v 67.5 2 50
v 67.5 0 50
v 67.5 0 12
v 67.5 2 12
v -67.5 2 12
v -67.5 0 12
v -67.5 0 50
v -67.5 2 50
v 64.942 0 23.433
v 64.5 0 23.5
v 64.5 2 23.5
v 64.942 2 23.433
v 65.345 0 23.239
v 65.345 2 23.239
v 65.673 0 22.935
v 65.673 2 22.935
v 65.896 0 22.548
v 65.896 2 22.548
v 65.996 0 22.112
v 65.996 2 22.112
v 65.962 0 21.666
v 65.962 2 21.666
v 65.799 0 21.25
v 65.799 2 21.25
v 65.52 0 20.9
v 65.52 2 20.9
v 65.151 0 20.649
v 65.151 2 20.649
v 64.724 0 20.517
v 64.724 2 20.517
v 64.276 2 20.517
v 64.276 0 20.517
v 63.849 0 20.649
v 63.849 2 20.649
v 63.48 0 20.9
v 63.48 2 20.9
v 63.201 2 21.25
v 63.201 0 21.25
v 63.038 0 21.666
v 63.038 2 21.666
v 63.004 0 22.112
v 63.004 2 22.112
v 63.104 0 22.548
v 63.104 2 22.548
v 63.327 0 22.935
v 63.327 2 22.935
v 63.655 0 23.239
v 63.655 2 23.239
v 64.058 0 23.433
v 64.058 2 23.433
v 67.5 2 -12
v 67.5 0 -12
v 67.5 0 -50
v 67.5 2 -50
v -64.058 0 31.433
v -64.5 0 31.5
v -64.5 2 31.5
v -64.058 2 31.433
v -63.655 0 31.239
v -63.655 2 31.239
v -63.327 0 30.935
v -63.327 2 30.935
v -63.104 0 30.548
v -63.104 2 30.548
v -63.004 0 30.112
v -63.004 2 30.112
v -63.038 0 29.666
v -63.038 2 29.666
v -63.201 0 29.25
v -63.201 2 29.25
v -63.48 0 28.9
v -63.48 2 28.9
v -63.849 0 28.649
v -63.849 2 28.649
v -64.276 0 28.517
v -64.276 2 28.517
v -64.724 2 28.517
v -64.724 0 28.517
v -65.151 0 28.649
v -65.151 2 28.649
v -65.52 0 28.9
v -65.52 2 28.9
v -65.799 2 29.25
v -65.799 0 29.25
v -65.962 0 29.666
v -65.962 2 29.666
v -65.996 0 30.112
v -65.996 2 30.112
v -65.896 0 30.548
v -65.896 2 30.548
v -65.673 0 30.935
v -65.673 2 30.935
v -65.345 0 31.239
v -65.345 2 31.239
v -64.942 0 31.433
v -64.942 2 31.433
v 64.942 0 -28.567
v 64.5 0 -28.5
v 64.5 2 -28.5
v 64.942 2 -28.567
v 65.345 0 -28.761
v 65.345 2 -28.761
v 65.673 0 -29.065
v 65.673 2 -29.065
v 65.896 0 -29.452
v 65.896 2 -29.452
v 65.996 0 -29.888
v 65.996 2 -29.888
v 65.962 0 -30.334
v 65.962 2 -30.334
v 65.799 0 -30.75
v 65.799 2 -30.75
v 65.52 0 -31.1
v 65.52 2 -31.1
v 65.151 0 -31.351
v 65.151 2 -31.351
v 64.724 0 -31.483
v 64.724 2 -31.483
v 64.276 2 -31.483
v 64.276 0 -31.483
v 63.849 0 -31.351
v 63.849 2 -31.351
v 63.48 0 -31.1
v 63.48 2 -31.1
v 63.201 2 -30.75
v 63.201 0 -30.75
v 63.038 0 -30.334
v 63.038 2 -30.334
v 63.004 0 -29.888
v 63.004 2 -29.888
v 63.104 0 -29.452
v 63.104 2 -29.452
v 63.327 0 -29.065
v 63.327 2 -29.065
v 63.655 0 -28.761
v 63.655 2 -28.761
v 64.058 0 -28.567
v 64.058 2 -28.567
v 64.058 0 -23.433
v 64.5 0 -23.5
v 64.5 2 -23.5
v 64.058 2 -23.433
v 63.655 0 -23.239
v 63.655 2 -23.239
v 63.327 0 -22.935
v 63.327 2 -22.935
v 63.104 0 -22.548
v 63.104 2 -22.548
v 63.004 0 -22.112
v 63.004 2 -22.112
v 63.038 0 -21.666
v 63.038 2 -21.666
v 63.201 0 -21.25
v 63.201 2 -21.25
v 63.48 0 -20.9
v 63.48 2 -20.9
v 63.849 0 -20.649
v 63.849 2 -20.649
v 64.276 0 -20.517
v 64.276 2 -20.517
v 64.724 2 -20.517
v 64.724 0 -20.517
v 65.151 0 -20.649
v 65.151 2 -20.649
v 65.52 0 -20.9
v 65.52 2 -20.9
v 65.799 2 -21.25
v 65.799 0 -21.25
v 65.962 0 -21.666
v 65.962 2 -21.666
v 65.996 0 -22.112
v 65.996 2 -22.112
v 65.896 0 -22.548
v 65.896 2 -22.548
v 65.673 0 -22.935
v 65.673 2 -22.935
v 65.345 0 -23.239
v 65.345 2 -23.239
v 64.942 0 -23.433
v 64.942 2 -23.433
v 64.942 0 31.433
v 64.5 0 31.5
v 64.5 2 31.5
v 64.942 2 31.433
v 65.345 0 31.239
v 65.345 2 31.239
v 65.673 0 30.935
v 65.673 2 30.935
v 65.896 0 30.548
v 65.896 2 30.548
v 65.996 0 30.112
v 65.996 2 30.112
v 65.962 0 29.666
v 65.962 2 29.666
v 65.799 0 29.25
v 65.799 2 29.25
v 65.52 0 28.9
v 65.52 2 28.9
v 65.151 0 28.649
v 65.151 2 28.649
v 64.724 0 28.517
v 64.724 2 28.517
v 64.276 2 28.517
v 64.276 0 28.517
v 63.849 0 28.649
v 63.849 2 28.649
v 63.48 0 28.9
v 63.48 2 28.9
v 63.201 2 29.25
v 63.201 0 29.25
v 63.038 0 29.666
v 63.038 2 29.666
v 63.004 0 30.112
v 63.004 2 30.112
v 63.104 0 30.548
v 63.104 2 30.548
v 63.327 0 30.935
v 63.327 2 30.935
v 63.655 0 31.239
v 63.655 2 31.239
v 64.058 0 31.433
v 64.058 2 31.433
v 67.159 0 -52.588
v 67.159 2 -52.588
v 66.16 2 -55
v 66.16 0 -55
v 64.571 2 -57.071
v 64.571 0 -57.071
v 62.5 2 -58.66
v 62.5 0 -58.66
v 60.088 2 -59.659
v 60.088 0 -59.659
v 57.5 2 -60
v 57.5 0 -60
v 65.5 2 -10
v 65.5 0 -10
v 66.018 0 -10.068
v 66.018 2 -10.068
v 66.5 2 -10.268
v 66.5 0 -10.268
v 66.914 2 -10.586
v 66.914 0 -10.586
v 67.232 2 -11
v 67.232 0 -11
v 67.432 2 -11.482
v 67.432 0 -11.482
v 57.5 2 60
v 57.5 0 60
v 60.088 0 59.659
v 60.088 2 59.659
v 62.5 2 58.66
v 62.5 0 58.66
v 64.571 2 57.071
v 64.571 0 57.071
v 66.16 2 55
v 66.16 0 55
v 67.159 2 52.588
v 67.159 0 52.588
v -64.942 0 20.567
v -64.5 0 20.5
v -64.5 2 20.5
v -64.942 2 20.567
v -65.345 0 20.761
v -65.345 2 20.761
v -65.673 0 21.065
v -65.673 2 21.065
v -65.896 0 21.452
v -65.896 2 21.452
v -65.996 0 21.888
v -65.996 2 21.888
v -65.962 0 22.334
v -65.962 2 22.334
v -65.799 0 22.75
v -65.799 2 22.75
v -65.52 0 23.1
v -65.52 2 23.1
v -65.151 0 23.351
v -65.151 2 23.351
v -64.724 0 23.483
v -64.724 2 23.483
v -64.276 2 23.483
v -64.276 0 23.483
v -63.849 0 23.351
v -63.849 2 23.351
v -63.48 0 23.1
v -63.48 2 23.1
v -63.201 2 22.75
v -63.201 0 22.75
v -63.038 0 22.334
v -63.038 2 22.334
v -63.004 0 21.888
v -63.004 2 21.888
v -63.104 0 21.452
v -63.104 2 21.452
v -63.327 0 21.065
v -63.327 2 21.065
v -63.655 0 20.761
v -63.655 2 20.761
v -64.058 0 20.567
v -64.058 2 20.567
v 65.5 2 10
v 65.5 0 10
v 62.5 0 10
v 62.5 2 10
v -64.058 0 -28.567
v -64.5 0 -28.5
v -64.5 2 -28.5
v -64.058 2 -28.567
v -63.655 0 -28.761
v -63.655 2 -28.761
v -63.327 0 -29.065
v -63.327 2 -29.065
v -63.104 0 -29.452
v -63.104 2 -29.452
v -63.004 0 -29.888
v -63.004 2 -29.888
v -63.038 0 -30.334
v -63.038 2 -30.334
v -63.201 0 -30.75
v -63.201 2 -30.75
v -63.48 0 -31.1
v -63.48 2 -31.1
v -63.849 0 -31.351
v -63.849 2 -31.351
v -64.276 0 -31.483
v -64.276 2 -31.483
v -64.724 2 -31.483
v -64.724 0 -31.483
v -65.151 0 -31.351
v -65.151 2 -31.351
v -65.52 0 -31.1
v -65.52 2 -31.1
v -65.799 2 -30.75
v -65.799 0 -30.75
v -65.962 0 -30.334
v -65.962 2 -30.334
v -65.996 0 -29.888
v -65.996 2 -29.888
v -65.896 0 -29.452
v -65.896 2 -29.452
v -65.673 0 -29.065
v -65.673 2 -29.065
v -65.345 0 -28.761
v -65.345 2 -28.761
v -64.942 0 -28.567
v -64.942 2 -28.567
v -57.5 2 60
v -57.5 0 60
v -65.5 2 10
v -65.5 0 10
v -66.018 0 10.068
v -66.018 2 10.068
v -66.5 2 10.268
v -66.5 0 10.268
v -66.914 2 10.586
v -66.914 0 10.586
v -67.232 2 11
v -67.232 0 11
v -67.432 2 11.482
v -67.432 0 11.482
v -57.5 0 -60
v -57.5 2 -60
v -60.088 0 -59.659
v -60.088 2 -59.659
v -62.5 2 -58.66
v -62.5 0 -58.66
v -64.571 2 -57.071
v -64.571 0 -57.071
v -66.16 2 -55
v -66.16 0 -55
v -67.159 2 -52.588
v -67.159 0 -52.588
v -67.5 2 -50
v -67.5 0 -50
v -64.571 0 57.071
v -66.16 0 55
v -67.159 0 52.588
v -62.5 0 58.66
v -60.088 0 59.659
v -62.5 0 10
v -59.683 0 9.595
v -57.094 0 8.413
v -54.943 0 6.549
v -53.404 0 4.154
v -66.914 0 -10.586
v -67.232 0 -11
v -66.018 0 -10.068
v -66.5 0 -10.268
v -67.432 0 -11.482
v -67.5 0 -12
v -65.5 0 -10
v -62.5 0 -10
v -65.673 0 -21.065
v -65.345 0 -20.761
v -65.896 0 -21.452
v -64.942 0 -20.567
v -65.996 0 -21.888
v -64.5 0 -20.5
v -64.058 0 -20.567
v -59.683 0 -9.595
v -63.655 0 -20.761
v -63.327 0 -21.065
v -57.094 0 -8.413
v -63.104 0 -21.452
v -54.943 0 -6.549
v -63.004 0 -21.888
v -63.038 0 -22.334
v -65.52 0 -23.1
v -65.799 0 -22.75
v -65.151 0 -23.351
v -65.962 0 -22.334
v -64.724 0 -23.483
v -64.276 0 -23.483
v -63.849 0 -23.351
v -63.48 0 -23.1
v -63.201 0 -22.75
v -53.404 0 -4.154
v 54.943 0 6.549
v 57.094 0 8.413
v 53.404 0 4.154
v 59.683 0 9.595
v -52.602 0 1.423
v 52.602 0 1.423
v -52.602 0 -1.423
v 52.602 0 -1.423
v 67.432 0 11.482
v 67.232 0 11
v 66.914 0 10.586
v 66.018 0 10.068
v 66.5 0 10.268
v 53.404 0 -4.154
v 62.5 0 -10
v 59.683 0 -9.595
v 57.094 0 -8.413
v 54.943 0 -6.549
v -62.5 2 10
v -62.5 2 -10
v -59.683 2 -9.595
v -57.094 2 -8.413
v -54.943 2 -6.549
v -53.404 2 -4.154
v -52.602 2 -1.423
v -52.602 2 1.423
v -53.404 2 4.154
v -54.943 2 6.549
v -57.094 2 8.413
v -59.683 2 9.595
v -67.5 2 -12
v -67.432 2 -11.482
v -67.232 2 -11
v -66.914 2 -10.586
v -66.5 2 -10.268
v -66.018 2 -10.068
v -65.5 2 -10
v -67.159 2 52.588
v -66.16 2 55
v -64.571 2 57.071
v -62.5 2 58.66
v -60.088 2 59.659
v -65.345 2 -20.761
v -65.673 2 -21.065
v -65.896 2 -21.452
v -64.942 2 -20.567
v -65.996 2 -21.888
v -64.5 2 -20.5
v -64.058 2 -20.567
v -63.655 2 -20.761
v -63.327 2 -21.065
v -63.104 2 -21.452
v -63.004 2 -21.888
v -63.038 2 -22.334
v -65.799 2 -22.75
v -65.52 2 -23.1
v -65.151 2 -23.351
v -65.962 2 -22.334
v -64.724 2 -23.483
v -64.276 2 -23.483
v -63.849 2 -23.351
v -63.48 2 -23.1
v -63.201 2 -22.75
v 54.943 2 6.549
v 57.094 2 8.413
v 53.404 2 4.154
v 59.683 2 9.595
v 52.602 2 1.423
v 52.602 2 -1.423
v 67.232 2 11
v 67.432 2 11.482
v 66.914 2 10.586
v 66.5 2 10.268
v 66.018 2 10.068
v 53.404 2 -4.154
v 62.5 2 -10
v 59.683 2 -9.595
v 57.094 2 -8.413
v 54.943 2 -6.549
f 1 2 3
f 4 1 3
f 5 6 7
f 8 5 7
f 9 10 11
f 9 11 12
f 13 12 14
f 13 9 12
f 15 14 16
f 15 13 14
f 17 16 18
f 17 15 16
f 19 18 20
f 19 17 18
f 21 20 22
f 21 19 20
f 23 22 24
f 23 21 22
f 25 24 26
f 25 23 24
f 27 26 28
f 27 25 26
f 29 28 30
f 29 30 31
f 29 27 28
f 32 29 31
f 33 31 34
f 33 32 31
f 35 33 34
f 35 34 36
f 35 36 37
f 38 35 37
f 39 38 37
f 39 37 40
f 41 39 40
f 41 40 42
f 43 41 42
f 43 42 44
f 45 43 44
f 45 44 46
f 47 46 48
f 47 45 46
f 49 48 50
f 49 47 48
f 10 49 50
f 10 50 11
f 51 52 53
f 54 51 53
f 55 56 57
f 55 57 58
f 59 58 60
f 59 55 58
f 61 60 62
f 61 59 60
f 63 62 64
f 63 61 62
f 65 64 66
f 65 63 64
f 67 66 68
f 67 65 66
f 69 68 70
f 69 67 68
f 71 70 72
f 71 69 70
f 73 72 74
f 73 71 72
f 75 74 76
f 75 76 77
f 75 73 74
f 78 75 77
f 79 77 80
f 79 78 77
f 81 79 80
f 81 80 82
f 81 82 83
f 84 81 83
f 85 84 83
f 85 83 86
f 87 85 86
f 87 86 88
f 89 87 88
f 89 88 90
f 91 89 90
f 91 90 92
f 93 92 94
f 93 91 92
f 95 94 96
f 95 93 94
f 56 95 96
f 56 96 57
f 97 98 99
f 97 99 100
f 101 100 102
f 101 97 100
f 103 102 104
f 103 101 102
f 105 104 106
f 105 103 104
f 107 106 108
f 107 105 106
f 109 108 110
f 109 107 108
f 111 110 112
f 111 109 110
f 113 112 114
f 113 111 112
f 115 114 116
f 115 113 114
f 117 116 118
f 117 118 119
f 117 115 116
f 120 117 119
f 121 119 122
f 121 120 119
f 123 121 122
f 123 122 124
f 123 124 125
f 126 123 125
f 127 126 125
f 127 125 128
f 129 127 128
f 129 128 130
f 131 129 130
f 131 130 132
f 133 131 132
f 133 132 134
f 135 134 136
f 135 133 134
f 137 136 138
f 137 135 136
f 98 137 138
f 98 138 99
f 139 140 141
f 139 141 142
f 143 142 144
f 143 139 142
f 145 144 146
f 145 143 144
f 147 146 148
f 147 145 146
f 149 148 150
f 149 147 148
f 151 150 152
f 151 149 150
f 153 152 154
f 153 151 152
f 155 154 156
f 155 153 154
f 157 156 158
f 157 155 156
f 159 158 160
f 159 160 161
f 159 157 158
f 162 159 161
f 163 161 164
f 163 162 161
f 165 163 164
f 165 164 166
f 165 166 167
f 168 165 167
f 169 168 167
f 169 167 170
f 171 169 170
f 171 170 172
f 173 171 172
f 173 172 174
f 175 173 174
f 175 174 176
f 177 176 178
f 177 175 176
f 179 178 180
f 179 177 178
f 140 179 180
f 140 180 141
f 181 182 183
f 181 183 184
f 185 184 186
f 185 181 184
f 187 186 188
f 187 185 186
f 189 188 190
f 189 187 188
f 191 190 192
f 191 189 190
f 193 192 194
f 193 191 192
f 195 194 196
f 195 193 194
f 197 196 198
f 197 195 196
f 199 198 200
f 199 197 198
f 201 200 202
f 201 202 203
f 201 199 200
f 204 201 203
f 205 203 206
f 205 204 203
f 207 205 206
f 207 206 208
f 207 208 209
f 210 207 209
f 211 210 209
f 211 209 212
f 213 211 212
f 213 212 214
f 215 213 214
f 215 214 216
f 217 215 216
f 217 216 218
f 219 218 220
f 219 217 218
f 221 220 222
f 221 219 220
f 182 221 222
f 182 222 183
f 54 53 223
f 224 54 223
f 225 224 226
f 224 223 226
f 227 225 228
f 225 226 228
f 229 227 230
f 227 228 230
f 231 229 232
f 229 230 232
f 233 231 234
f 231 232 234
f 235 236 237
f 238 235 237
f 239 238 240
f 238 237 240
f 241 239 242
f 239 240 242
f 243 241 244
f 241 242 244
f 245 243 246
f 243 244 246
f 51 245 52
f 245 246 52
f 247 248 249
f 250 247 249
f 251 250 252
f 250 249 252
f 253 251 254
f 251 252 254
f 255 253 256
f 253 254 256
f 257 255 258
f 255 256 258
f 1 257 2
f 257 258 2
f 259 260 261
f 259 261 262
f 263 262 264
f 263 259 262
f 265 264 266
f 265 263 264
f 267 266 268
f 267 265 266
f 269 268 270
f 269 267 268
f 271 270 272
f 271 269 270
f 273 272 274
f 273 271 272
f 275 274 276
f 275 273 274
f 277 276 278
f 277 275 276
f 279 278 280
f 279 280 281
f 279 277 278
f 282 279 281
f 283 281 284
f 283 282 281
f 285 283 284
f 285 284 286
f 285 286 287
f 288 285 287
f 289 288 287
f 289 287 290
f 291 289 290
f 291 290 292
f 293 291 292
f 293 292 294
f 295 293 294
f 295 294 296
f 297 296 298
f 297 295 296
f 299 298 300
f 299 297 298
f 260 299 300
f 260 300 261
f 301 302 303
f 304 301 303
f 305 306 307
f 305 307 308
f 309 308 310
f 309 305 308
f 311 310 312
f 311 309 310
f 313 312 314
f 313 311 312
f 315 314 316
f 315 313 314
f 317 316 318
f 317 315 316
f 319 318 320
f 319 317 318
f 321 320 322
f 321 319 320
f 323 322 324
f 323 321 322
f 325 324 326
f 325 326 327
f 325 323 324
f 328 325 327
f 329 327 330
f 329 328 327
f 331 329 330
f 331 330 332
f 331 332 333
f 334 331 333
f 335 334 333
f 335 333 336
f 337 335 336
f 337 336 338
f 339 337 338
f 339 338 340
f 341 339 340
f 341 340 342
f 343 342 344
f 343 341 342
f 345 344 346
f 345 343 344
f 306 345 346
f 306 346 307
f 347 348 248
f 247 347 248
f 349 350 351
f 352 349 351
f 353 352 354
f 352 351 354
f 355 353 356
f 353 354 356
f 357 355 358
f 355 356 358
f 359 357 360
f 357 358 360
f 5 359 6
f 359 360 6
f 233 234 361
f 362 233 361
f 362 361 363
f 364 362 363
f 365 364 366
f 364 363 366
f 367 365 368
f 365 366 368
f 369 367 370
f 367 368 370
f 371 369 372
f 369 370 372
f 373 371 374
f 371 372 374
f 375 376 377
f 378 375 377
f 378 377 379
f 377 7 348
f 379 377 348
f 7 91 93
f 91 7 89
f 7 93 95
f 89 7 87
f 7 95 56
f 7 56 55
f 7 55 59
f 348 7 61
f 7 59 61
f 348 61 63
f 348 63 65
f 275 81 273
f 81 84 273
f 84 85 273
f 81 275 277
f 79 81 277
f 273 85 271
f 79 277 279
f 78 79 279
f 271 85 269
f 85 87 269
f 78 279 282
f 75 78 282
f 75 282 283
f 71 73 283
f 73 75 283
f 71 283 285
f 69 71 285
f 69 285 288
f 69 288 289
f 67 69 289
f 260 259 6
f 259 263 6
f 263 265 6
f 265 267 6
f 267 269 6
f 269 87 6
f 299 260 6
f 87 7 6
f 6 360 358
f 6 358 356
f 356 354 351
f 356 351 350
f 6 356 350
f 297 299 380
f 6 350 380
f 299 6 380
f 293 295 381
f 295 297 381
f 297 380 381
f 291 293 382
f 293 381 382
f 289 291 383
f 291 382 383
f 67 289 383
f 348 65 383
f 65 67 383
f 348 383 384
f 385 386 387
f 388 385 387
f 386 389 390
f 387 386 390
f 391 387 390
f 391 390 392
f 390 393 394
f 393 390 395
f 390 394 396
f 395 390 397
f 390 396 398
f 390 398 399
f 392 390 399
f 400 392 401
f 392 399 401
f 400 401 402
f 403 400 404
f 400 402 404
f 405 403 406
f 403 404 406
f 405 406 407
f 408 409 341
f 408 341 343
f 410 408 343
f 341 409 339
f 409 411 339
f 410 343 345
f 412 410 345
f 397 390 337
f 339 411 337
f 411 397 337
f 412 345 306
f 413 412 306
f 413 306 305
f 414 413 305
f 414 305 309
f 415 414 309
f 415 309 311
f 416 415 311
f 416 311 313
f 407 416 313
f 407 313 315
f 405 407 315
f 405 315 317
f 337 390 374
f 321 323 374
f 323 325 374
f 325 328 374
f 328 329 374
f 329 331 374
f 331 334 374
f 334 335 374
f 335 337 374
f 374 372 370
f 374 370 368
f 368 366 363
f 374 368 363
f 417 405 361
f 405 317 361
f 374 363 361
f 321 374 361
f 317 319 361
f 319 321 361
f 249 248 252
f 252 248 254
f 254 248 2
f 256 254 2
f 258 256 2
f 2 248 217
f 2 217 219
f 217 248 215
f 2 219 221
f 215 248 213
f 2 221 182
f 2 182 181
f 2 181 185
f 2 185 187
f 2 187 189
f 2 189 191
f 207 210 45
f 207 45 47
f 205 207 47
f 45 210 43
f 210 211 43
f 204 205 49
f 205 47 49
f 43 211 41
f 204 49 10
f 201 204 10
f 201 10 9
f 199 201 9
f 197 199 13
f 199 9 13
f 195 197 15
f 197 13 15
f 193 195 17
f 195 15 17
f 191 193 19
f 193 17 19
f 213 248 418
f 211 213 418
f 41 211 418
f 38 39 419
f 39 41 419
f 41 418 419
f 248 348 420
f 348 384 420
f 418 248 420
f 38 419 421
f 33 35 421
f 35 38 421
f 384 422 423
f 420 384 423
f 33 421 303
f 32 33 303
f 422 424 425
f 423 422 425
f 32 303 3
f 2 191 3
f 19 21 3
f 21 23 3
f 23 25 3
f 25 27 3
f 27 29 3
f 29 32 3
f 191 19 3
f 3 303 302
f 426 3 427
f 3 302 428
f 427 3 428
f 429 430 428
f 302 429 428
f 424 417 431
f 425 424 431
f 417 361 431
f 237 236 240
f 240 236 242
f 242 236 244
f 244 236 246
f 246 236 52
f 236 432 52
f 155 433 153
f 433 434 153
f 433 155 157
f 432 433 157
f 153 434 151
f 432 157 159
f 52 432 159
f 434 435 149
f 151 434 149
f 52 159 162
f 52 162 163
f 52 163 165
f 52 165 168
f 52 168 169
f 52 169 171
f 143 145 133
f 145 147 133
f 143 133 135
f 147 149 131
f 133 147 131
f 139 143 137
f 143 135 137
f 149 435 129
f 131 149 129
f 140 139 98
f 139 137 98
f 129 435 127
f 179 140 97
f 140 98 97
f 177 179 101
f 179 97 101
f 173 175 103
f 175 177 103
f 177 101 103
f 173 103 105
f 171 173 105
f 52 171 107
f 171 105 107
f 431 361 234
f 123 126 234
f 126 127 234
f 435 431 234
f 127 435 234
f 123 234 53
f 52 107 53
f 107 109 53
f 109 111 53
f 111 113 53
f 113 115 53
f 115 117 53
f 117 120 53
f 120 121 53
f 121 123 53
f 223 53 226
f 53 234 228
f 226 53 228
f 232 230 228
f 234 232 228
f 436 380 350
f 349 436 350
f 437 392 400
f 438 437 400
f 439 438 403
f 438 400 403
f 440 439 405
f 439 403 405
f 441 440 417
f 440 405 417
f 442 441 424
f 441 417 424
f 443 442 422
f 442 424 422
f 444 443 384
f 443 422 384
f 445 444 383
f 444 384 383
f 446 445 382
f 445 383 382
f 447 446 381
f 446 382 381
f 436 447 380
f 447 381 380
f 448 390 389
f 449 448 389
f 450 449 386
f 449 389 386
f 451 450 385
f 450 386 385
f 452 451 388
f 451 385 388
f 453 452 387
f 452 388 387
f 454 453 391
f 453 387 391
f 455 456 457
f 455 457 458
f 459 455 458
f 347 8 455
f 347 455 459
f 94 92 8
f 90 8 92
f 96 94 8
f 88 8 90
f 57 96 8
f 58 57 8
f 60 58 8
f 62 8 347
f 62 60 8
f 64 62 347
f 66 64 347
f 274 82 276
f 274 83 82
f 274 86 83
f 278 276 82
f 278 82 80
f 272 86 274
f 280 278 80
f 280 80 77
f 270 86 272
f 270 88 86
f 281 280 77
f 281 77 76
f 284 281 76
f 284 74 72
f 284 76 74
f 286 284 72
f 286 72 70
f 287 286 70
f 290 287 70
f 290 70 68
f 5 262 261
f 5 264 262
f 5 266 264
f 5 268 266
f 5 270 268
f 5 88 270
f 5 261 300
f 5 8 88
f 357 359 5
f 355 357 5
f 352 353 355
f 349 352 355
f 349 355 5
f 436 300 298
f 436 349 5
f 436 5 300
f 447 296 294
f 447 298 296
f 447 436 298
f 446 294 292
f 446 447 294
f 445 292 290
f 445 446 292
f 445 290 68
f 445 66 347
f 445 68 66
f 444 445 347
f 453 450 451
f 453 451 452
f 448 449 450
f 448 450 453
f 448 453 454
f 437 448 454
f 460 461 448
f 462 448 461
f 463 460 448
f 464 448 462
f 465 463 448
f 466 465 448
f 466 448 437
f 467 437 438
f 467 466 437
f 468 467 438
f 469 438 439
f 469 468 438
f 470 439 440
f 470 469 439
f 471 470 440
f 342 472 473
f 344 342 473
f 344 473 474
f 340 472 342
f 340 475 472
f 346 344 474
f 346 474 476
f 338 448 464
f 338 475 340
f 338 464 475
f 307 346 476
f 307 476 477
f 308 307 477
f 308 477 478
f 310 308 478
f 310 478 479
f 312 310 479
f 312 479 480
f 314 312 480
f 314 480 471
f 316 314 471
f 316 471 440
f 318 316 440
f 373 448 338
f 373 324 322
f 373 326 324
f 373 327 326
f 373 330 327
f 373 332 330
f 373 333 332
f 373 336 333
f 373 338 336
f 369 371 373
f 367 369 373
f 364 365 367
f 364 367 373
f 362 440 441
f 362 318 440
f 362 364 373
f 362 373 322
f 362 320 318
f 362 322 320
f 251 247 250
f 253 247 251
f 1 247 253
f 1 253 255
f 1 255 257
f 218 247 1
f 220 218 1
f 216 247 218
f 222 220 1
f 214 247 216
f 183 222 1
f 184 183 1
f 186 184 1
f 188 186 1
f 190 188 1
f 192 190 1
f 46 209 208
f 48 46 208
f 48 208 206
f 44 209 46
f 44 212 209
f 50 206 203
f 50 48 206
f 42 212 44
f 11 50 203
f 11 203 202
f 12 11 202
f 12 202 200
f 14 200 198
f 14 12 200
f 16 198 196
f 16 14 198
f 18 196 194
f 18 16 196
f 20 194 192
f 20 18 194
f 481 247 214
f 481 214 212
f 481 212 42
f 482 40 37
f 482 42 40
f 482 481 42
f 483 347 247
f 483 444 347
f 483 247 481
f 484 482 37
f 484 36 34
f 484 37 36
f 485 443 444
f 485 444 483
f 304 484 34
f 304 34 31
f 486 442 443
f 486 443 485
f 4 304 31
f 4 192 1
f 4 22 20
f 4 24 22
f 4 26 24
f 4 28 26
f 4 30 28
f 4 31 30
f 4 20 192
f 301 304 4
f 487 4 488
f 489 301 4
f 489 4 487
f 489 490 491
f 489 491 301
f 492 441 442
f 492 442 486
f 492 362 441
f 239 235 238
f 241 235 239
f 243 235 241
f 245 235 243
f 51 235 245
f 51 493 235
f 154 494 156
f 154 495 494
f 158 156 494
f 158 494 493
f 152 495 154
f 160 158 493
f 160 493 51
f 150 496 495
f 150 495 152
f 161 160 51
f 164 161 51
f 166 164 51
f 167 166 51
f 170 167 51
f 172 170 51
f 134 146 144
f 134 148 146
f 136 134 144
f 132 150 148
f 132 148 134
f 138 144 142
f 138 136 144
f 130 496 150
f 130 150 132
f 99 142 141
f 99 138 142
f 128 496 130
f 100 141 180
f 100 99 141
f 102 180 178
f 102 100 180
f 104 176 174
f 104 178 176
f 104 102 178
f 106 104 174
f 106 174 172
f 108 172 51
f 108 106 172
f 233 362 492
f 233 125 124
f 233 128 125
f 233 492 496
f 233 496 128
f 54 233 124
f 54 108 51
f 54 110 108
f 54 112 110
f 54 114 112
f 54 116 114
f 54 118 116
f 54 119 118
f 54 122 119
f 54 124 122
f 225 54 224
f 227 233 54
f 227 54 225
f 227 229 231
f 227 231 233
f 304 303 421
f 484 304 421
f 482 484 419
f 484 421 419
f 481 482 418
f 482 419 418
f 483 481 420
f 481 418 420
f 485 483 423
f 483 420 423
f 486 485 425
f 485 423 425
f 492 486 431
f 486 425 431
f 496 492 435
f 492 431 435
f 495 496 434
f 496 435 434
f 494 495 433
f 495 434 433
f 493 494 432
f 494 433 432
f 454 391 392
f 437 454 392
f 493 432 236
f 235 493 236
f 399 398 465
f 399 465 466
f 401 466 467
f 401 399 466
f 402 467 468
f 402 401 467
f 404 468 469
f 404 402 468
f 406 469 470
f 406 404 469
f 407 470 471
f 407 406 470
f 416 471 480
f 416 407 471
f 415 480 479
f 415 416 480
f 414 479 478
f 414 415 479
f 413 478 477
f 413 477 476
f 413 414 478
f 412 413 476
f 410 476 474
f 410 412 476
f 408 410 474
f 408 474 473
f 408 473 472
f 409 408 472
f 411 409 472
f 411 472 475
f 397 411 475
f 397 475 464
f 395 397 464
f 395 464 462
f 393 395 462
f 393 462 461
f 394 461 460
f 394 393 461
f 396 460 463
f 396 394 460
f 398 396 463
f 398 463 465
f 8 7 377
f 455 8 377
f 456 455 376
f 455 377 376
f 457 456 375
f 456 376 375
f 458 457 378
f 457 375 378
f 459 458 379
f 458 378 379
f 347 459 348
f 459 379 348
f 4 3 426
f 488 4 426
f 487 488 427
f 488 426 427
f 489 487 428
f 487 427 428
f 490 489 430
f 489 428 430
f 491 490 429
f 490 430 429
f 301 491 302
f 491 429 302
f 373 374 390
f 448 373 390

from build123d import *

# Parameters (mm, degrees)
SKETCH_1_R      = 1.5
EXTRUDE_1_DEPTH = 2


with BuildPart() as part:
    # 草图1 → 凸台-拉伸1 (new body)
    with BuildSketch(Plane(origin=(0, 0, 0), x_dir=(1, 0, 0), z_dir=(0, 1, 0))):
        with BuildLine():
            Line((-65.5, 10), (-62.5, 10))
            ThreePointArc((-62.5, 10), (-52.5, 0), (-62.5, -10))
            Line((-62.5, -10), (-65.5, -10))
            ThreePointArc((-65.5, -10), (-66.914213562, -10.585786438), (-67.5, -12))
            Line((-67.5, -12), (-67.5, -50))
            ThreePointArc((-67.5, -50), (-64.571067812, -57.071067812), (-57.5, -60))
            Line((-57.5, -60), (57.5, -60))
            ThreePointArc((57.5, -60), (64.571067812, -57.071067812), (67.5, -50))
            Line((67.5, -50), (67.5, -12))
            ThreePointArc((67.5, -12), (66.914213562, -10.585786438), (65.5, -10))
            Line((65.5, -10), (62.5, -10))
            ThreePointArc((62.5, -10), (52.5, 0), (62.5, 10))
            Line((62.5, 10), (65.5, 10))
            ThreePointArc((65.5, 10), (66.914213562, 10.585786438), (67.5, 12))
            Line((67.5, 12), (67.5, 50))
            ThreePointArc((67.5, 50), (64.571067812, 57.071067812), (57.5, 60))
            Line((57.5, 60), (-57.5, 60))
            ThreePointArc((-57.5, 60), (-64.571067812, 57.071067812), (-67.5, 50))
            Line((-67.5, 50), (-67.5, 12))
            ThreePointArc((-67.5, 12), (-66.914213562, 10.585786438), (-65.5, 10))
        make_face()
        with Locations(Location((-64.5, 30, 0), (0, 0, 270))):
            Circle(SKETCH_1_R, mode=Mode.SUBTRACT)
        with Locations(Location((64.5, 30, 0), (0, 0, 270))):
            Circle(SKETCH_1_R, mode=Mode.SUBTRACT)
        with Locations(Location((64.5, -30, 0), (0, 0, 270))):
            Circle(SKETCH_1_R, mode=Mode.SUBTRACT)
        with Locations(Location((-64.5, -30, 0), (0, 0, 270))):
            Circle(SKETCH_1_R, mode=Mode.SUBTRACT)
        with Locations(Location((-64.5, 22, 0), (0, 0, 270))):
            Circle(SKETCH_1_R, mode=Mode.SUBTRACT)
        with Locations(Location((64.5, 22, 0), (0, 0, 90))):
            Circle(SKETCH_1_R, mode=Mode.SUBTRACT)
        with Locations(Location((64.5, -22, 0), (0, 0, 270))):
            Circle(SKETCH_1_R, mode=Mode.SUBTRACT)
        with Locations(Location((-64.5, -22, 0), (0, 0, 90))):
            Circle(SKETCH_1_R, mode=Mode.SUBTRACT)
    extrude(amount=EXTRUDE_1_DEPTH)


solid = part.part
